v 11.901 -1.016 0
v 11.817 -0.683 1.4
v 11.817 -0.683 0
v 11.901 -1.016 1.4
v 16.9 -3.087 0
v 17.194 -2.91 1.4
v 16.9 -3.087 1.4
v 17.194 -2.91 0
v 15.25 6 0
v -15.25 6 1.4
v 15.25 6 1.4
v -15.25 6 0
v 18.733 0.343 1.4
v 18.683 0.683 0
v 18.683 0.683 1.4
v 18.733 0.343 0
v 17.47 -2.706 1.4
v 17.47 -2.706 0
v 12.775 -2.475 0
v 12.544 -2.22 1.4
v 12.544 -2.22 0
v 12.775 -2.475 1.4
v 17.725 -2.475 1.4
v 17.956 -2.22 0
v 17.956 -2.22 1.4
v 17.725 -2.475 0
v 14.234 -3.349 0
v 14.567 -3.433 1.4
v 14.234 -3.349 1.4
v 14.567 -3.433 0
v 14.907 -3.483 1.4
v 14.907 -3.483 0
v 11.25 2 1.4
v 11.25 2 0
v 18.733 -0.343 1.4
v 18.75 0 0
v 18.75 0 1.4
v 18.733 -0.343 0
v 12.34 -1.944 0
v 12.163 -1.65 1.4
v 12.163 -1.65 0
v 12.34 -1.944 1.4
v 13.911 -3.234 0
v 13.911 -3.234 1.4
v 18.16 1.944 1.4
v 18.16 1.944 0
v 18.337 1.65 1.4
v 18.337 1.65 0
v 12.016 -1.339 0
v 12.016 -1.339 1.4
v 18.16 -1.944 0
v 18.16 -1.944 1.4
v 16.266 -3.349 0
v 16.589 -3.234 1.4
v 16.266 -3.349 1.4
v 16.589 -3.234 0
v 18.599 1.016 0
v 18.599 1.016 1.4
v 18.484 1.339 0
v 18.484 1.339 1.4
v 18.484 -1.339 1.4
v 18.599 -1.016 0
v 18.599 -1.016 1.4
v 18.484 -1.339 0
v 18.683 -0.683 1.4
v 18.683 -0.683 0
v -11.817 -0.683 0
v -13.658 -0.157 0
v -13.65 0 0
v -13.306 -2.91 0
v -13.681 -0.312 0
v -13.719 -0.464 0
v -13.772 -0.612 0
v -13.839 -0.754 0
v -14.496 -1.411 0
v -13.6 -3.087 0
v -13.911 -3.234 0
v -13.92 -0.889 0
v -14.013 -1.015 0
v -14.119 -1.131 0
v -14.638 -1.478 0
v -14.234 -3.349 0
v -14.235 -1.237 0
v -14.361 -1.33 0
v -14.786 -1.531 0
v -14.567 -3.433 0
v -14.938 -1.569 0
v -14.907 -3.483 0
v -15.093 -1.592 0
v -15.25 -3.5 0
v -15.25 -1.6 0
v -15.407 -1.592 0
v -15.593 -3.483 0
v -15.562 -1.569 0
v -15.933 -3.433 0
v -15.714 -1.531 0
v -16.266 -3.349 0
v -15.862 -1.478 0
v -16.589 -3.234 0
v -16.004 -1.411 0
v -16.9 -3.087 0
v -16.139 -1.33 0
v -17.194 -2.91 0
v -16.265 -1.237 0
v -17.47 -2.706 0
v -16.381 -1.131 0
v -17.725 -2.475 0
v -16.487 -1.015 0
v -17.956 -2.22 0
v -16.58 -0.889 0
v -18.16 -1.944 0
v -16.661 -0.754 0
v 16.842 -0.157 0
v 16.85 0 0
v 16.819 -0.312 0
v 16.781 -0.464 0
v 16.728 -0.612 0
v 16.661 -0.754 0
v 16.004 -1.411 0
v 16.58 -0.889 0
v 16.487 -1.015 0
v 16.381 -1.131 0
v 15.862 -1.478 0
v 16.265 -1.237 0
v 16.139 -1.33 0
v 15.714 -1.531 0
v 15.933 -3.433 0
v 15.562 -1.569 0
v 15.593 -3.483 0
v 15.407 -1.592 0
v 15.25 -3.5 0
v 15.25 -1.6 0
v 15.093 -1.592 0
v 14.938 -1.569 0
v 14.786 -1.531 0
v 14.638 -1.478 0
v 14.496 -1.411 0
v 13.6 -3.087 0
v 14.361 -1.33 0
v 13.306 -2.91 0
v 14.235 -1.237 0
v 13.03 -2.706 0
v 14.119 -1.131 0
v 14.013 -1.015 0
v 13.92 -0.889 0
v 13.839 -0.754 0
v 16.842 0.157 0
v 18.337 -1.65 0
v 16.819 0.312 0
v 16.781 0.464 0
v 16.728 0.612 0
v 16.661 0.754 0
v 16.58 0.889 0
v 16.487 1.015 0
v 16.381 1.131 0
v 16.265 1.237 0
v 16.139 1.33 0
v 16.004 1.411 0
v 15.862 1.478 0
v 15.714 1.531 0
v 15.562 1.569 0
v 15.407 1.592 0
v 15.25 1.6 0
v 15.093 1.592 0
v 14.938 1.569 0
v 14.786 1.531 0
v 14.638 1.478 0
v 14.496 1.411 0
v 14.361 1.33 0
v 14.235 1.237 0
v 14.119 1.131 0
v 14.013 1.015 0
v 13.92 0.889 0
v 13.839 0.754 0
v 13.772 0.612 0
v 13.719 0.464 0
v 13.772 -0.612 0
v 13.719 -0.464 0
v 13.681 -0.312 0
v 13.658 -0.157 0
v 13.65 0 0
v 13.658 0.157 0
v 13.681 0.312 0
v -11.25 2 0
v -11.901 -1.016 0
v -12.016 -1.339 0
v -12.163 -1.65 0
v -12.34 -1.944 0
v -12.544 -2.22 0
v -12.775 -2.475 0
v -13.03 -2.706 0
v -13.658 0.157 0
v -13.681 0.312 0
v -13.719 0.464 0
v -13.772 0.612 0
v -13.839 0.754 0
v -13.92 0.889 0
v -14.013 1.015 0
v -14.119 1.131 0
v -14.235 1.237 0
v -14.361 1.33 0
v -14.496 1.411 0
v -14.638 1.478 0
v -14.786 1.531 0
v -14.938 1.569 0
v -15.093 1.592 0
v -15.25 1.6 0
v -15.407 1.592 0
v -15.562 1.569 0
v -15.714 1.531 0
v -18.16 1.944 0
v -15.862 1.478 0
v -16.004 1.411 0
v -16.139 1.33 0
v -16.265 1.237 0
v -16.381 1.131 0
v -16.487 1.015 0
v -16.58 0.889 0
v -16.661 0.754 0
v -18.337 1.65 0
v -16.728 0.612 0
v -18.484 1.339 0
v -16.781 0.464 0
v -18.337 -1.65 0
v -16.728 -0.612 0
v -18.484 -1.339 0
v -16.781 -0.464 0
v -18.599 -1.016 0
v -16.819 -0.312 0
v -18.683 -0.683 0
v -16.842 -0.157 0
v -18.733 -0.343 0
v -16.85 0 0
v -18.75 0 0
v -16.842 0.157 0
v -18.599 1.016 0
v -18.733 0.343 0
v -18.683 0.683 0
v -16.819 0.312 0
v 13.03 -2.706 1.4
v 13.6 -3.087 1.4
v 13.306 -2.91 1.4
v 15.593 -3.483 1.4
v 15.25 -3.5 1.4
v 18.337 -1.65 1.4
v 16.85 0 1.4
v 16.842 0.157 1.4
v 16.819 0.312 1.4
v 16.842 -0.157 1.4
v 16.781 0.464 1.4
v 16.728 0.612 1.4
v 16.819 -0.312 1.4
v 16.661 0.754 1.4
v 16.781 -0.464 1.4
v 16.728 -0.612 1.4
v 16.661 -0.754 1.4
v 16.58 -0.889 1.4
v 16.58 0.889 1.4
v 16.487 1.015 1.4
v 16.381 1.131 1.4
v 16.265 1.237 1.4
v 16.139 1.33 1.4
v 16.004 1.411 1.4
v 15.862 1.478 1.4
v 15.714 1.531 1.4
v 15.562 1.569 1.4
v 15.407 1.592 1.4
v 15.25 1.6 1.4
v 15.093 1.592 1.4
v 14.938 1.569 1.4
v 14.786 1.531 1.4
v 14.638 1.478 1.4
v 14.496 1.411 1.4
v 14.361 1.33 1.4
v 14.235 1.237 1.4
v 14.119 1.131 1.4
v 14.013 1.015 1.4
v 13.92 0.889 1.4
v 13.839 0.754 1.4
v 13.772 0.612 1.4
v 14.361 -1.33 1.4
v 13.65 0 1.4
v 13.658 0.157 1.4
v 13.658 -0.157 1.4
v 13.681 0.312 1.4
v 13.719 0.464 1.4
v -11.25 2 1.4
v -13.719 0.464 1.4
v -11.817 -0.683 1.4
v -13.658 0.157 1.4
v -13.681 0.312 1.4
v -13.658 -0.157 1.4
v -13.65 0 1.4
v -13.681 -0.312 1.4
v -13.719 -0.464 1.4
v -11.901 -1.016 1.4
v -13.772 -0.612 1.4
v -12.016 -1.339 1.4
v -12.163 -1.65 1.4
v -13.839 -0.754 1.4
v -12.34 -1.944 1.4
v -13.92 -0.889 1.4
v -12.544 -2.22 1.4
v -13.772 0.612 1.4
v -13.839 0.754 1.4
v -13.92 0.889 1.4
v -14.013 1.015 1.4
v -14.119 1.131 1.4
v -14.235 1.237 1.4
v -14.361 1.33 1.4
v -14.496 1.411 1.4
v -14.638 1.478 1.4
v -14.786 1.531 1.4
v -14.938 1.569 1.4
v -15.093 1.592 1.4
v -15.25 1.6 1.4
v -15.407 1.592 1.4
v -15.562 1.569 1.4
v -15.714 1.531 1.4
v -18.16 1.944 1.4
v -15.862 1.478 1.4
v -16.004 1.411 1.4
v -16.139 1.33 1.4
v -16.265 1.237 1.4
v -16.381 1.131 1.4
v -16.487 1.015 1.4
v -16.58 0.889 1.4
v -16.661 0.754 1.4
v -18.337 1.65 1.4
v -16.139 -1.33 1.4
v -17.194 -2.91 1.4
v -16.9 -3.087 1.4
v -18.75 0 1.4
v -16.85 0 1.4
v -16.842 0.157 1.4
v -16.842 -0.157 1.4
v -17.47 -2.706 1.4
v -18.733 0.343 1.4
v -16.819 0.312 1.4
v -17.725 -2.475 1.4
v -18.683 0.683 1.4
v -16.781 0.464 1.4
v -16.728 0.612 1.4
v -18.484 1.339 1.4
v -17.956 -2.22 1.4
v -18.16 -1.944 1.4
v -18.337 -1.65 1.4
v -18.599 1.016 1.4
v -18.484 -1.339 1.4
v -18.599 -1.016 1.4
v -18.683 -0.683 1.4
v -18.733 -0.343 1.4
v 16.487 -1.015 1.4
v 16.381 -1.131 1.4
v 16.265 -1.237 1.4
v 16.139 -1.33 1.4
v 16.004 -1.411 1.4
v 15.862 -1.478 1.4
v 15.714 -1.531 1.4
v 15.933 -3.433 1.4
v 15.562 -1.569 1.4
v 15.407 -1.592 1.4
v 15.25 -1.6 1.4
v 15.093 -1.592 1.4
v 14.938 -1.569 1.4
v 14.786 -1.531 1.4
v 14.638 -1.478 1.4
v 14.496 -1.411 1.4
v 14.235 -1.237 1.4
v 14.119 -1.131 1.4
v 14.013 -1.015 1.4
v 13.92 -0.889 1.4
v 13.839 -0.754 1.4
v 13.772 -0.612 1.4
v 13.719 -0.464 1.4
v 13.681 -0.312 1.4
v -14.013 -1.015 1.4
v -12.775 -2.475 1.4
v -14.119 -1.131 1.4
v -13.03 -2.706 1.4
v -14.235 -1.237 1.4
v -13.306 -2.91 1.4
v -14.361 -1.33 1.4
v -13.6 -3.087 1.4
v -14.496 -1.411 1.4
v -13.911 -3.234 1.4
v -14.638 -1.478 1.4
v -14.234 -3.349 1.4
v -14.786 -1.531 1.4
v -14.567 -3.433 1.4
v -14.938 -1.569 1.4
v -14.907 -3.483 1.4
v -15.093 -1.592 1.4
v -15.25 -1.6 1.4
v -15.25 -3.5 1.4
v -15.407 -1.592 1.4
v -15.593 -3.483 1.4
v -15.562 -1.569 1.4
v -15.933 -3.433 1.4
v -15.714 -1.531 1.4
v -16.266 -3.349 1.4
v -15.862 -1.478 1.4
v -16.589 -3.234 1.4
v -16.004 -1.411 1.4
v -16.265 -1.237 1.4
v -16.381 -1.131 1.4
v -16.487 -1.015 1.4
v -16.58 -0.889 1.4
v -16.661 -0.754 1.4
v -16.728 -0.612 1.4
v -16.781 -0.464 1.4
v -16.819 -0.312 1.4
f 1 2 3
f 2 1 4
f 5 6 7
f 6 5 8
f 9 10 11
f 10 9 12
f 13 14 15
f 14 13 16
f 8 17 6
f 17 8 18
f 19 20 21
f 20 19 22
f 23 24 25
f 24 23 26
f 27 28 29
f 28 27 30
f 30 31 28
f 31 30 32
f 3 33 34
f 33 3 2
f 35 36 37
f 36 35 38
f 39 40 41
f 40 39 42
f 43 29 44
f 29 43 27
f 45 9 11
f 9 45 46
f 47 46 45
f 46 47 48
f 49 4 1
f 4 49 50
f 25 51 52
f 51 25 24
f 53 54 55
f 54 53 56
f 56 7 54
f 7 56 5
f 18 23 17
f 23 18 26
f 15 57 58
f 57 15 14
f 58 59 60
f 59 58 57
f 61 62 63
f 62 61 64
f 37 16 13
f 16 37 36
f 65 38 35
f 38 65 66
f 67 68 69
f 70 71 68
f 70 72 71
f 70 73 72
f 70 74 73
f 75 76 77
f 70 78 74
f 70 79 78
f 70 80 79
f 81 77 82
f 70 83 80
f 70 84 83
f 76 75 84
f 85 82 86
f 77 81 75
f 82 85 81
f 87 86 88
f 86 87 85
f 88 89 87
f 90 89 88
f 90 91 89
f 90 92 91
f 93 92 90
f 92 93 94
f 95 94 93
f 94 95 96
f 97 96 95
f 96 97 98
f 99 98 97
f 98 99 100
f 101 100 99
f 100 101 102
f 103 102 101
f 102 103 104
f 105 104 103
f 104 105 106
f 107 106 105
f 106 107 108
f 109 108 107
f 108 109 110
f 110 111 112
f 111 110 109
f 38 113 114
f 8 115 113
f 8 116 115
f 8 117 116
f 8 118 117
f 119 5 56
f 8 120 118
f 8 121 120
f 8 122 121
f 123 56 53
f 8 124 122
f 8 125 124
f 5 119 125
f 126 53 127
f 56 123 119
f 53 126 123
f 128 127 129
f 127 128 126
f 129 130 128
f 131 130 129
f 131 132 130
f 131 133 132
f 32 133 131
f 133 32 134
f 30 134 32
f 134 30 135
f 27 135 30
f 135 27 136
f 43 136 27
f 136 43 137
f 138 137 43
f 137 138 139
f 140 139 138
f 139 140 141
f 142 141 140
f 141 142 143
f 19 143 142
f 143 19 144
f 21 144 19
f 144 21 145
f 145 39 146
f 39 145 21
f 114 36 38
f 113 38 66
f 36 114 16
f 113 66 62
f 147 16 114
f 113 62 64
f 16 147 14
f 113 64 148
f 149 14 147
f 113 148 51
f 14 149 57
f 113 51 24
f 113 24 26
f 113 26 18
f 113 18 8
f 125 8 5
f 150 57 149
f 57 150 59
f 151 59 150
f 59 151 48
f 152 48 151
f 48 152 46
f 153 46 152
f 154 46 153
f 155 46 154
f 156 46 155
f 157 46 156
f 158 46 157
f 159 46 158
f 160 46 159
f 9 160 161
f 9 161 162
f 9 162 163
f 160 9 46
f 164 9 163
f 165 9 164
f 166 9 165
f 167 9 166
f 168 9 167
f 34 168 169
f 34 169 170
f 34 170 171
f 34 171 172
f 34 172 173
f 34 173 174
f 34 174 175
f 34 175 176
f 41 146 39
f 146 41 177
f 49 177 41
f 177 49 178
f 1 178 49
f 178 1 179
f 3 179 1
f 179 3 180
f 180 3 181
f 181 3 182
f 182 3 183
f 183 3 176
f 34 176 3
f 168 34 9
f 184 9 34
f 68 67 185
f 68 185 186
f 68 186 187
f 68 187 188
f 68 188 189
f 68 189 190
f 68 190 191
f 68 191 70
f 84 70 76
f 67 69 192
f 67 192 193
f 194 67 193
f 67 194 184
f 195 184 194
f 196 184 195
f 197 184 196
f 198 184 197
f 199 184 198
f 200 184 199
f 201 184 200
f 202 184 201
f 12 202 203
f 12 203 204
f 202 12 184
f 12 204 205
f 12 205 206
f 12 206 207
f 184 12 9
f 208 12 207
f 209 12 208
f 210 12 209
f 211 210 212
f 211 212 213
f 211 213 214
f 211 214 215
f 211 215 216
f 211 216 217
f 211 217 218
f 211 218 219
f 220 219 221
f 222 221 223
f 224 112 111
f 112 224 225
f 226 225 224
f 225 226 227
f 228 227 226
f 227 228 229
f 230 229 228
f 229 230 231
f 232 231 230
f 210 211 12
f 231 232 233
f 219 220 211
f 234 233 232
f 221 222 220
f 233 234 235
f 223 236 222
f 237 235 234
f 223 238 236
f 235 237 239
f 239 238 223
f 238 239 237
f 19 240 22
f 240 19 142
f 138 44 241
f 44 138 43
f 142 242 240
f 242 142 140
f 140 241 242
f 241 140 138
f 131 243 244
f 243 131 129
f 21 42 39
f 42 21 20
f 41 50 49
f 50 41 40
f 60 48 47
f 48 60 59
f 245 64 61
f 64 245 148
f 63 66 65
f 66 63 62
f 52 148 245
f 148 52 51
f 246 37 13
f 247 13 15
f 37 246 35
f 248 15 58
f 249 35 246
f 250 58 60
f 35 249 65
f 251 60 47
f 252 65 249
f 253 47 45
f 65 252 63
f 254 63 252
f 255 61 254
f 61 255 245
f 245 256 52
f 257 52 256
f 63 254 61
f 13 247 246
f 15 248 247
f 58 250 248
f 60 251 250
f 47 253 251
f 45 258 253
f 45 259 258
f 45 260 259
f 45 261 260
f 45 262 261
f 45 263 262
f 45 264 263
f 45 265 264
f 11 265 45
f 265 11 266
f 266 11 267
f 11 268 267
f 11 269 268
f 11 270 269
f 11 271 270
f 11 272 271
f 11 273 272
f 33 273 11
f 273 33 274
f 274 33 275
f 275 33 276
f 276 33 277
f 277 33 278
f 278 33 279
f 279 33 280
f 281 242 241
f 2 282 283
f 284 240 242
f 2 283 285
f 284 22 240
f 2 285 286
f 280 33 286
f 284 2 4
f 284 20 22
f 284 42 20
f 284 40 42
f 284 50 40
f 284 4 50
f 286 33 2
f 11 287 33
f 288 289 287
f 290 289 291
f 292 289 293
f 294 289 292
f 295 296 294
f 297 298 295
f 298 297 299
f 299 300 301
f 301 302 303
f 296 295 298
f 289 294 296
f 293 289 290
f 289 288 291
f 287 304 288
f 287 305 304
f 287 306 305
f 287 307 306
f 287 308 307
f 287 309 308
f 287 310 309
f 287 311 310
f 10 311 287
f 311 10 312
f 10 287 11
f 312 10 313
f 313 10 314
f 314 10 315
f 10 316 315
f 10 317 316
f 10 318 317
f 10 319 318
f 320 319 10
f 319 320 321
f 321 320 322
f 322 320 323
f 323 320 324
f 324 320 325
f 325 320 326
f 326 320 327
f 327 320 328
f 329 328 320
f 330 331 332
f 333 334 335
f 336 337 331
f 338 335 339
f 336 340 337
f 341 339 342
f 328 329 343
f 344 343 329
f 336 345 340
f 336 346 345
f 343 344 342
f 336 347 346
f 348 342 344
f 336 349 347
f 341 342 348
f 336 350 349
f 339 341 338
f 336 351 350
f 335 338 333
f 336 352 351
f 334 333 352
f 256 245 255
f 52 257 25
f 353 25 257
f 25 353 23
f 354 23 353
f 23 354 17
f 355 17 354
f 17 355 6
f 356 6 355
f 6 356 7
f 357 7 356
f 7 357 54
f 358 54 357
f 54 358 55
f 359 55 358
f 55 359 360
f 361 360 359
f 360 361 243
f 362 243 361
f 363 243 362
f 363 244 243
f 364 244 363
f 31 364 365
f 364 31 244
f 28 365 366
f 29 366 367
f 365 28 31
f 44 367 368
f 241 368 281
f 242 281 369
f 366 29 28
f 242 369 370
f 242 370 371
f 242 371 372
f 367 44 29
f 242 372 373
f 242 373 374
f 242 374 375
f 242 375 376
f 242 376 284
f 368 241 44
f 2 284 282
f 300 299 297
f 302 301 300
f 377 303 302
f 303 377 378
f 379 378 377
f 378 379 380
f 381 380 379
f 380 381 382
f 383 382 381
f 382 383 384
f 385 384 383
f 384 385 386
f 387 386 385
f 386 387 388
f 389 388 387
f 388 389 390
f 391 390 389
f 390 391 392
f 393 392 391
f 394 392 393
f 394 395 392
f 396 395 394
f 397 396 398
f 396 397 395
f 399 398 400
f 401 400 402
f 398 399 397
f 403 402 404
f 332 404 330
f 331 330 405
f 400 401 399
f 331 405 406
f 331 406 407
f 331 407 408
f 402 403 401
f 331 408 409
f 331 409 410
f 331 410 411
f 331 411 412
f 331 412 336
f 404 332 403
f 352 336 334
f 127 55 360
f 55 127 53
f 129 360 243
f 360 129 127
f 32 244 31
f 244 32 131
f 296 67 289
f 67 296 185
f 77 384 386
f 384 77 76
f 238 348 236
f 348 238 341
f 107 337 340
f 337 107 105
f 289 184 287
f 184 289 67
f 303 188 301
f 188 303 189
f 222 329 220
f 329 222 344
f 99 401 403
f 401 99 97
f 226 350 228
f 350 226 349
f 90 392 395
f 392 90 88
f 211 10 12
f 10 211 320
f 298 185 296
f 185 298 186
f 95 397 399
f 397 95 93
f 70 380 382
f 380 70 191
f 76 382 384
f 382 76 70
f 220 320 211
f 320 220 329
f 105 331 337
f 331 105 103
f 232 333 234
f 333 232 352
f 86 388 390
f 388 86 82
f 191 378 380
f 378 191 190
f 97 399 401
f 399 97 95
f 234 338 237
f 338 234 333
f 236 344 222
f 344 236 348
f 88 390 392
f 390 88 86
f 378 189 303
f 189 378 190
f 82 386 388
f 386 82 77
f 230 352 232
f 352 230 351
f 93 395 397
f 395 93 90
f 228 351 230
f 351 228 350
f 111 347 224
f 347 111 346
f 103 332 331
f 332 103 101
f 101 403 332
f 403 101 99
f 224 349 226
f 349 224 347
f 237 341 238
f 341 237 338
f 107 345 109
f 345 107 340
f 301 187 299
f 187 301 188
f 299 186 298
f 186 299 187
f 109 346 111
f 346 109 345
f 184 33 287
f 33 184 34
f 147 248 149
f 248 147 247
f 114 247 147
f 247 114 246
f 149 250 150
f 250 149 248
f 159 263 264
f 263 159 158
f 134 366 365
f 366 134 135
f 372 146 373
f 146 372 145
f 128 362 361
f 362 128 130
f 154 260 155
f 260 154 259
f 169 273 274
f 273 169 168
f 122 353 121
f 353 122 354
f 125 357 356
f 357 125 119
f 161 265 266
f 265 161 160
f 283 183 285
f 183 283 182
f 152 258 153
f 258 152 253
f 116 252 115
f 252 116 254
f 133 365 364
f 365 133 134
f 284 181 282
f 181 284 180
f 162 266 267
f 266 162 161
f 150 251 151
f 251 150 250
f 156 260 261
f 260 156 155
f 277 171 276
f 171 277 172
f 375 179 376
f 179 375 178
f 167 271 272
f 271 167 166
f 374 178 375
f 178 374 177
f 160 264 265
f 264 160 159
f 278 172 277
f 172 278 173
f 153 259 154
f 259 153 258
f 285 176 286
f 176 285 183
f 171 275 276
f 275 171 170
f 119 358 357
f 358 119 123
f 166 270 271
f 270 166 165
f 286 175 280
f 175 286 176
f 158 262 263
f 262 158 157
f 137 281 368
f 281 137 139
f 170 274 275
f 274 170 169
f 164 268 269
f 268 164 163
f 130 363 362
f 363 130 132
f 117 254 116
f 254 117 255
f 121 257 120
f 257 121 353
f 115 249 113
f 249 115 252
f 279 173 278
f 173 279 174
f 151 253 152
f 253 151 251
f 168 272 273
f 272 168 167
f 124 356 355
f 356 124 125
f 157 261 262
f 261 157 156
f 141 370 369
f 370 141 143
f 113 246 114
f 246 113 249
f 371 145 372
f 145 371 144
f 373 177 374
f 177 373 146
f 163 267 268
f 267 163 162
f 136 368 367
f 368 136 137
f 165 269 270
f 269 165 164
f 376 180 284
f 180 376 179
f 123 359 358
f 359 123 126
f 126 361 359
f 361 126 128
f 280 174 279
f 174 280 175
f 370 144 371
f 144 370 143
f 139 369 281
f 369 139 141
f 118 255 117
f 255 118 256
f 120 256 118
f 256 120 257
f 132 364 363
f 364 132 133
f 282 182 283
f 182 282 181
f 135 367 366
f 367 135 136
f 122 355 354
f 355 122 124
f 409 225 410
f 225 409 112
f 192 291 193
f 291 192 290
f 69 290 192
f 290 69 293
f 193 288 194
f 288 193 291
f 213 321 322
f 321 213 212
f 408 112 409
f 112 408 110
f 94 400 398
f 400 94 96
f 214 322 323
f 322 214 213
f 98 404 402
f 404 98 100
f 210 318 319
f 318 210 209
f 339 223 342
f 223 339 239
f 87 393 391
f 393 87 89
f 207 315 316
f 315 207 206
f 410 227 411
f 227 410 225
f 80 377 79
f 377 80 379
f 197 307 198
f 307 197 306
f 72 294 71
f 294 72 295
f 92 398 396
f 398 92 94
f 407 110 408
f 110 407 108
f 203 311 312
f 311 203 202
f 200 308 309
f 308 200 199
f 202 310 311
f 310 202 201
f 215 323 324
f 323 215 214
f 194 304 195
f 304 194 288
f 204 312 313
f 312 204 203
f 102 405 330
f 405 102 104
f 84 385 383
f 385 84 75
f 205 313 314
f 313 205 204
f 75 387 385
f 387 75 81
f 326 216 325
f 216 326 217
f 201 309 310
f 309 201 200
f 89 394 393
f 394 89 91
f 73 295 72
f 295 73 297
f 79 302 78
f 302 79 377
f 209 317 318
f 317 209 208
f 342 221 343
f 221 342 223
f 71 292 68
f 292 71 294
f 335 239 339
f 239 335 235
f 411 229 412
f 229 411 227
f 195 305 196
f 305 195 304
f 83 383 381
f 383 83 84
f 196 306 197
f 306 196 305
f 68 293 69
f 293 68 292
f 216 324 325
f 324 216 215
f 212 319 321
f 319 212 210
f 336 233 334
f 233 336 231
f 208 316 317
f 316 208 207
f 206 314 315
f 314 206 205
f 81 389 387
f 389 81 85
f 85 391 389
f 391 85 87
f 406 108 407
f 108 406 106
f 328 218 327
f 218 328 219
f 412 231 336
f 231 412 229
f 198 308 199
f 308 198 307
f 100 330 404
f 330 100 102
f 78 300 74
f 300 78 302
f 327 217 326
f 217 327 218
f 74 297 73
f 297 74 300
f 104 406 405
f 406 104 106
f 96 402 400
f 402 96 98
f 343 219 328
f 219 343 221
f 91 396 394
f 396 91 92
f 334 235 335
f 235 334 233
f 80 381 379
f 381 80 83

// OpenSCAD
$fn = 64;
washer_diameter = 7;
washer_height = 1.4;
m3_hole = 3.2;
hole_spacing_front = 30.5;

/* 
 * SHORTCUT VARIABLES
 */

// hole spacing front half 
hsfh = hole_spacing_front / 2;

difference() {
    union() {
        hull() {
            translate([hsfh, 0, 0]) cylinder(d = washer_diameter, h = washer_height);
            translate([hsfh - 4, 2, 0]) cube([4, 4, washer_height]);
        }
        hull() {
            translate([-hsfh, 0, 0]) cylinder(d = washer_diameter, h = washer_height);
            translate([-hsfh, 2, 0]) cube([4, 4, washer_height]);
        }
        translate([-hsfh, 2, 0]) cube([hole_spacing_front, 4, washer_height]);
    }
    // M3 holes
    translate([hsfh, 0, -0.01]) cylinder(d = m3_hole, h = washer_height + 0.02);
    translate([-hsfh, 0, -0.01]) cylinder(d = m3_hole, h = washer_height + 0.02);
}
